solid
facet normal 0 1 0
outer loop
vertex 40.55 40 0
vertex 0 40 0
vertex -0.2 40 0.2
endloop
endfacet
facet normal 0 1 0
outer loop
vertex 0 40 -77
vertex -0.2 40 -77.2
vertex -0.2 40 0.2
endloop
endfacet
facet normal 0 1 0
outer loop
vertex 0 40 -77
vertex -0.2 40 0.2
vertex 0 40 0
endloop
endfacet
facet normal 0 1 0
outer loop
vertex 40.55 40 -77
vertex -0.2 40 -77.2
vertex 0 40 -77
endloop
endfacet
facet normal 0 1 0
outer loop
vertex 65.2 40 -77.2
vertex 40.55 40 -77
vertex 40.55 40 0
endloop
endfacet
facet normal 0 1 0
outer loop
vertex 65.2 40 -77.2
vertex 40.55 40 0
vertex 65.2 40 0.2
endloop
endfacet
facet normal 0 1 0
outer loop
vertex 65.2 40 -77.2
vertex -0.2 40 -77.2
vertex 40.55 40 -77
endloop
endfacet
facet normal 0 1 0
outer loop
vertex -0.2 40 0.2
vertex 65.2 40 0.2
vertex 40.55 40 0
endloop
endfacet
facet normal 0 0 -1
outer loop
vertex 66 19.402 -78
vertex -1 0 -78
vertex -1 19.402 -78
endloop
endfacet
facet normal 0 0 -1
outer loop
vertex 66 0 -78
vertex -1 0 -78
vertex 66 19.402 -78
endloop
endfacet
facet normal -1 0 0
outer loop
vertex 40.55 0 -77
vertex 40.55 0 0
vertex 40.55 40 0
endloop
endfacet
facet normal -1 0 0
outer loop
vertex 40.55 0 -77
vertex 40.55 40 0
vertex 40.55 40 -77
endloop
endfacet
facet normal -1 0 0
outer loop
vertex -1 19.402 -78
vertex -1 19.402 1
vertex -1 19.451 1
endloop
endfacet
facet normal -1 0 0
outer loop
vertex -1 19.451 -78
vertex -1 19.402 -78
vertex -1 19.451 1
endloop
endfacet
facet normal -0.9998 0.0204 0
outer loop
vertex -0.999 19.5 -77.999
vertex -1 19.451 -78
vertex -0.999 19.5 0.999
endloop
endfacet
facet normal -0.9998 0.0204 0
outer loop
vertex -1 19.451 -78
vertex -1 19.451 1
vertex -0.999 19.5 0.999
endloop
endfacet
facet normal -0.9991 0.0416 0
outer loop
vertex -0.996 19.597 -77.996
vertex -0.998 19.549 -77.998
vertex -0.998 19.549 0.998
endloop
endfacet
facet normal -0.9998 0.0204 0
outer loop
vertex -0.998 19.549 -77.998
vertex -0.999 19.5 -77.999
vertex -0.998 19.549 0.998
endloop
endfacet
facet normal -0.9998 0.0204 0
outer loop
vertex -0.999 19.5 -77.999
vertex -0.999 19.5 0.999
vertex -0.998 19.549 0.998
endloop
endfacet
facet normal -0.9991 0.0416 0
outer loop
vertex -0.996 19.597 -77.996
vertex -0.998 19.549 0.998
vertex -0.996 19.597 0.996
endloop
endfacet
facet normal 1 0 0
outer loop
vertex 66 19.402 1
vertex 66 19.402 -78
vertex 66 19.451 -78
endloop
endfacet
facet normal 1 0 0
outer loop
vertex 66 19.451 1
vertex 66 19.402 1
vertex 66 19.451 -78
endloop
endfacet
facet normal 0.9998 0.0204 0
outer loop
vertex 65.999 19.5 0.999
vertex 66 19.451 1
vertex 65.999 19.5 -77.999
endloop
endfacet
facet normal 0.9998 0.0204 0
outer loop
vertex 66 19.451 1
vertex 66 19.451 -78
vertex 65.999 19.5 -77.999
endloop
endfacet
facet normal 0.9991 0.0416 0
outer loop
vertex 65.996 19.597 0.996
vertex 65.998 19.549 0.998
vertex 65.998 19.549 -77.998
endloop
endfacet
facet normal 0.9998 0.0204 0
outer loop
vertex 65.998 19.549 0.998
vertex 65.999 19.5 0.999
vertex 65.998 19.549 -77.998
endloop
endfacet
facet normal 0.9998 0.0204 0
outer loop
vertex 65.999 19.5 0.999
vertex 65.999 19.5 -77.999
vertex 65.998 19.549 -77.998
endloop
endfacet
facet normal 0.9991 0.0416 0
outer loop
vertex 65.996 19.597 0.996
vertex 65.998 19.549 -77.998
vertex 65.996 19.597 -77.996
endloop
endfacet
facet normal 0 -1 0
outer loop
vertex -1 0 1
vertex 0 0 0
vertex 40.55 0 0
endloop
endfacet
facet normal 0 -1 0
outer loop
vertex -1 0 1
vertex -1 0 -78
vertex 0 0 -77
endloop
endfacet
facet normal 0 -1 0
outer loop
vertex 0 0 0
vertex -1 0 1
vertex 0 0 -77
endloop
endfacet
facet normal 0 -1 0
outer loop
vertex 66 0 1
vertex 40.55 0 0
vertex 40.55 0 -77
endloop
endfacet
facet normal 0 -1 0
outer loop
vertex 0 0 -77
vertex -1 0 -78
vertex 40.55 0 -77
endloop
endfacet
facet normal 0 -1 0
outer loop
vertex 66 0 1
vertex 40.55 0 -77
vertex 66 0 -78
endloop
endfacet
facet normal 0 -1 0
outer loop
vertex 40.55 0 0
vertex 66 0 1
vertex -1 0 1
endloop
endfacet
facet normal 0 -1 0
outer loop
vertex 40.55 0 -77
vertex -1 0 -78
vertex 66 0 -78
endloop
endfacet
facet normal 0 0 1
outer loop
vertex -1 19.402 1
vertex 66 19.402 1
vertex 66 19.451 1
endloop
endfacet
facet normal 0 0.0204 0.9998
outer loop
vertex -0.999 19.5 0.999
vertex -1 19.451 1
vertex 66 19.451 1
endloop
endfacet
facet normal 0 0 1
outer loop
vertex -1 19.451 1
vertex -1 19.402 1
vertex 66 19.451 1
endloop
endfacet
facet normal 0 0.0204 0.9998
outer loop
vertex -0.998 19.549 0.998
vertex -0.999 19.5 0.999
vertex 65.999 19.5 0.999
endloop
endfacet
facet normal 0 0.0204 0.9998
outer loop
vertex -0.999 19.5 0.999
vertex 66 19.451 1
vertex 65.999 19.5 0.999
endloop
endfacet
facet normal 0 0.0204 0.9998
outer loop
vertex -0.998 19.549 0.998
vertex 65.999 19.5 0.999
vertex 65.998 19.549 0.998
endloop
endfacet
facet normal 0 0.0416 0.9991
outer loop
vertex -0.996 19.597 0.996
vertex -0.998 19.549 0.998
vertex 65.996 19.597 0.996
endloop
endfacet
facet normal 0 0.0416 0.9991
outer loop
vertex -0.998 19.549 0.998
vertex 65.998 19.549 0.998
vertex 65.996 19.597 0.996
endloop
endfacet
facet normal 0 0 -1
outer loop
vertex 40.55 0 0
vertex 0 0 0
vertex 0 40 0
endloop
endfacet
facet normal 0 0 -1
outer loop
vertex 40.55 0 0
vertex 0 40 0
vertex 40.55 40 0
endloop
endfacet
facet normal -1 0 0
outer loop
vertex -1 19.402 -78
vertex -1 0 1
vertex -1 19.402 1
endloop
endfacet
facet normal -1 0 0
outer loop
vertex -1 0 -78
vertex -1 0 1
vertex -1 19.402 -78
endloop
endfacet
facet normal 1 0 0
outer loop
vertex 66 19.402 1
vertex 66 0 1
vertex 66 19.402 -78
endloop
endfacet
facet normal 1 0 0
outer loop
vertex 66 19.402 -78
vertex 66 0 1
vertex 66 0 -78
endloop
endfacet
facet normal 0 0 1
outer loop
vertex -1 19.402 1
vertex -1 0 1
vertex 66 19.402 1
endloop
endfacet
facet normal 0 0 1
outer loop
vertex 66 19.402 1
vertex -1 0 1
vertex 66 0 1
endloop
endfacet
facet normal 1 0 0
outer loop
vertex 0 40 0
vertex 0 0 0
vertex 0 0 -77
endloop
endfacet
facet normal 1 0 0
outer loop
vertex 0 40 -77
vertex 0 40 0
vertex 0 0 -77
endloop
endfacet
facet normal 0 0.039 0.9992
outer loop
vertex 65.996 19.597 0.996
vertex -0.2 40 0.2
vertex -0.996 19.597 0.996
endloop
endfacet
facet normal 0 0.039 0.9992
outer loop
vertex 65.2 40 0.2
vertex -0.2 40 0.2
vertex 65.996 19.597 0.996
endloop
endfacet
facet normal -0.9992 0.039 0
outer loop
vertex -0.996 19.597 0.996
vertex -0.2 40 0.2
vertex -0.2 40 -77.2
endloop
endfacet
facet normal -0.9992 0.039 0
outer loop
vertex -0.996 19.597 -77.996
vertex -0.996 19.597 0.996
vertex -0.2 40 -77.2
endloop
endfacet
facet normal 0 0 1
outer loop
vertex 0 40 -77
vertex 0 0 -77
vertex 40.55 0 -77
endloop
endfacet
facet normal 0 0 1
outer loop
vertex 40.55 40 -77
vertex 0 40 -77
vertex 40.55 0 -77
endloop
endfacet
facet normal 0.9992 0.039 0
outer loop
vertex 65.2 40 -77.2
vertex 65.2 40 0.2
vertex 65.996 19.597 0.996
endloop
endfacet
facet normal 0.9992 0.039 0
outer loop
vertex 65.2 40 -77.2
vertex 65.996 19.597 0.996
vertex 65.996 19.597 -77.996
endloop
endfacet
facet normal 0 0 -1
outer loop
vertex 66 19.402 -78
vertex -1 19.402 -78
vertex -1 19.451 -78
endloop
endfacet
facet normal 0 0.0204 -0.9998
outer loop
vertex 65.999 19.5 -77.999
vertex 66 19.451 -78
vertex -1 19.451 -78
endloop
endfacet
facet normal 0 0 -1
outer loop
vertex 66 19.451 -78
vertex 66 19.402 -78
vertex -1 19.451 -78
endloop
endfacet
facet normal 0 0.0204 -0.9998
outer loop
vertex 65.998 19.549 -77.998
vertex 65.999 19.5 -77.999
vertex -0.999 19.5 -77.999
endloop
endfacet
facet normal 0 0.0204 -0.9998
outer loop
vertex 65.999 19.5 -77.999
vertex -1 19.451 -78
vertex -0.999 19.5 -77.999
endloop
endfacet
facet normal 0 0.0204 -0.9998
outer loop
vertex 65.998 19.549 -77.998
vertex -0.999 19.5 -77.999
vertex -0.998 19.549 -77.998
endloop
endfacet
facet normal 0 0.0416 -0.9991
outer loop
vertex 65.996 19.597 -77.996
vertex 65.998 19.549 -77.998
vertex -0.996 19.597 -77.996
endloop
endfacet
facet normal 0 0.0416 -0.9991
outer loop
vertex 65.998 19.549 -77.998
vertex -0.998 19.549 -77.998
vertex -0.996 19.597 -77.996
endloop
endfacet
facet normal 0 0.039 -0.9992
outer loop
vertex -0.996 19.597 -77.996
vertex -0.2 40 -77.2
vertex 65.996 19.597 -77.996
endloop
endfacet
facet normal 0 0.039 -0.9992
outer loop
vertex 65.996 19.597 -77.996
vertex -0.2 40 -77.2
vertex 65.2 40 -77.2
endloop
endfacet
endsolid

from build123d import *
from OCP.BRepFilletAPI import BRepFilletAPI_MakeChamfer

# Parameters (mm, degrees)
SKIZZE1_W                       = 67
SKIZZE1_H                       = 79
SKIZZE1_W_2                     = 40.55
SKIZZE1_H_2                     = 77
AUFSATZ_LINEAR_AUSTRAGEN2_DEPTH = 40
FASE1_SIZE                      = 20.5
FASE1_SIZE2                     = 0.8
VERRUNDUNG2_R                   = 5


with BuildPart() as part:
    # Skizze1 → Aufsatz-Linear austragen2 (new body)
    with BuildSketch(Plane(origin=(0, 0, 0), x_dir=(1, 0, 0), z_dir=(0, 1, 0))):
        with Locations((32.5, 38.5)):
            Rectangle(SKIZZE1_W, SKIZZE1_H)
        with Locations((20.275, 38.5)):
            Rectangle(SKIZZE1_W_2, SKIZZE1_H_2, mode=Mode.SUBTRACT)
    extrude(amount=AUFSATZ_LINEAR_AUSTRAGEN2_DEPTH)

    # Fase1: one chamfer whose edges measure the first distance from different faces: ONE call of the kernel's chamfer builder (chamfer() names one face for all edges)
    fase1_edges_1 = [part.edges().sort_by_distance(p)[0] for p in [
        (66, 40, -38.5),
    ]]
    fase1_side_1 = [part.faces().sort_by_distance(p)[0] for p in [
        (66, 20, -38.5),
    ]]
    fase1_edges_2 = [part.edges().sort_by_distance(p)[0] for p in [
        (32.5, 40, -78),
    ]]
    fase1_side_2 = [part.faces().sort_by_distance(p)[0] for p in [
        (32.5, 20, -78),
    ]]
    fase1_edges_3 = [part.edges().sort_by_distance(p)[0] for p in [
        (-1, 40, -38.5),
    ]]
    fase1_side_3 = [part.faces().sort_by_distance(p)[0] for p in [
        (-1, 20, -38.5),
    ]]
    fase1_edges_4 = [part.edges().sort_by_distance(p)[0] for p in [
        (32.5, 40, 1),
    ]]
    fase1_side_4 = [part.faces().sort_by_distance(p)[0] for p in [
        (32.5, 20, 1),
    ]]
    fase1 = BRepFilletAPI_MakeChamfer(part.part.solid().wrapped)
    for e in fase1_edges_1:
        fase1.Add(FASE1_SIZE, FASE1_SIZE2, e.wrapped, fase1_side_1[0].wrapped)  # the first distance lies on this face
    for e in fase1_edges_2:
        fase1.Add(FASE1_SIZE, FASE1_SIZE2, e.wrapped, fase1_side_2[0].wrapped)  # the first distance lies on this face
    for e in fase1_edges_3:
        fase1.Add(FASE1_SIZE, FASE1_SIZE2, e.wrapped, fase1_side_3[0].wrapped)  # the first distance lies on this face
    for e in fase1_edges_4:
        fase1.Add(FASE1_SIZE, FASE1_SIZE2, e.wrapped, fase1_side_4[0].wrapped)  # the first distance lies on this face
    add(Compound.cast(fase1.Shape()), mode=Mode.REPLACE)

    # Verrundung2
    # the kernel refuses this fillet: 5 mm, written as the material it takes off along each edge
    with BuildSketch(Plane(origin=(-1.24380965, 19.5, -78), x_dir=(0, -1, 0), z_dir=(1, 0, 0)), Plane(origin=(66.24380965, 19.5, 1), x_dir=(0, -1, 0), z_dir=(-1, 0, 0))) as verrundung2_piece_1:
        with BuildLine():
            CenterArc((VERRUNDUNG2_R * 0.019504771978, -VERRUNDUNG2_R), VERRUNDUNG2_R, 90, 2.234798859)
            Line((-VERRUNDUNG2_R * 0.0194899369818, -VERRUNDUNG2_R * 0.000760582906605), (0, 0))
            Line((0, 0), (VERRUNDUNG2_R * 0.019504771978, 0))
        make_face()
    extrude(amount=67.487619299, mode=Mode.SUBTRACT)
    with BuildSketch(Plane(origin=(66, 19.5, -78.24380965), x_dir=(0, -1, 0), z_dir=(0, 0, 1)), Plane(origin=(-1, 19.5, 1.24380965), x_dir=(0, -1, 0), z_dir=(0, 0, -1))) as verrundung2_piece_2:
        with BuildLine():
            CenterArc((VERRUNDUNG2_R * 0.019504771978, -VERRUNDUNG2_R), VERRUNDUNG2_R, 90, 2.234798859)
            Line((-VERRUNDUNG2_R * 0.0194899369818, -VERRUNDUNG2_R * 0.000760582906605), (0, 0))
            Line((0, 0), (VERRUNDUNG2_R * 0.019504771978, 0))
        make_face()
    extrude(amount=79.487619299, mode=Mode.SUBTRACT)


solid = part.part
